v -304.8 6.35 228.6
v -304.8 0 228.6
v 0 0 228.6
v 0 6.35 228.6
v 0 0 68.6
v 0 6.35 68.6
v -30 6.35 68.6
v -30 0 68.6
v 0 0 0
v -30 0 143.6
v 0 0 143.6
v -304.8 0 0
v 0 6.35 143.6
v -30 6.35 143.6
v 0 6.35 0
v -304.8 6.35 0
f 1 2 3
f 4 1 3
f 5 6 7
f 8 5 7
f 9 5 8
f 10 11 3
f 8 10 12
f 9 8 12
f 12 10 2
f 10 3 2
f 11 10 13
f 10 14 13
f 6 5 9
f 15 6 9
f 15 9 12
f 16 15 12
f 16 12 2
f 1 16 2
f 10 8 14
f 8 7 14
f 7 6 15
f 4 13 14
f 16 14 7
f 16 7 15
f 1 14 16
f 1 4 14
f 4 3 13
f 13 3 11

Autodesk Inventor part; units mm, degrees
ref_plane "YZ Plane" through (0, 0, 0) normal (1, 0, 0) x (0, 1, 0)
ref_plane "XZ Plane" through (0, 0, 0) normal (0, 1, 0) x (-1, 0, 0)
ref_plane "XY Plane" through (0, 0, 0) normal (0, 0, 1) x (1, 0, 0)
sketch "Sketch1" plane through (0, 0, 0) normal (0, 1, 0) x (-1, 0, 0)
  line L0 (0, 0) -> (304.8, 0)
  line L1 (304.8, 0) -> (304.8, 228.6)
  line L2 (304.8, 228.6) -> (0, 228.6)
  line L3 (0, 228.6) -> (0, 0)
  dimension "d0" = 228.6
  dimension "d1" = 304.8
extrude "Extrusion1" add sketch "Sketch1" along normal blind 6.35
sketch "Sketch2" plane through (0, 6.35, 0) normal (0, 1, 0) x (1, 0, 0)
  line L0 (0, -228.6) -> (0, 0) projected
  line L1 (0, -68.6) -> (-30, -68.6)
  line L2 (-30, -68.6) -> (-30, -143.6)
  line L3 (-30, -143.6) -> (0, -143.6)
  line L4 (0, -143.6) -> (0, -68.6)
  line L5 (-304.8, -228.6) -> (0, -228.6) projected
  dimension "d4" = 75
  dimension "d5" = 85
  dimension "d6" = 30
extrude "Extrusion2" cut sketch "Sketch2" against normal blind 10
properties part number "Board"
